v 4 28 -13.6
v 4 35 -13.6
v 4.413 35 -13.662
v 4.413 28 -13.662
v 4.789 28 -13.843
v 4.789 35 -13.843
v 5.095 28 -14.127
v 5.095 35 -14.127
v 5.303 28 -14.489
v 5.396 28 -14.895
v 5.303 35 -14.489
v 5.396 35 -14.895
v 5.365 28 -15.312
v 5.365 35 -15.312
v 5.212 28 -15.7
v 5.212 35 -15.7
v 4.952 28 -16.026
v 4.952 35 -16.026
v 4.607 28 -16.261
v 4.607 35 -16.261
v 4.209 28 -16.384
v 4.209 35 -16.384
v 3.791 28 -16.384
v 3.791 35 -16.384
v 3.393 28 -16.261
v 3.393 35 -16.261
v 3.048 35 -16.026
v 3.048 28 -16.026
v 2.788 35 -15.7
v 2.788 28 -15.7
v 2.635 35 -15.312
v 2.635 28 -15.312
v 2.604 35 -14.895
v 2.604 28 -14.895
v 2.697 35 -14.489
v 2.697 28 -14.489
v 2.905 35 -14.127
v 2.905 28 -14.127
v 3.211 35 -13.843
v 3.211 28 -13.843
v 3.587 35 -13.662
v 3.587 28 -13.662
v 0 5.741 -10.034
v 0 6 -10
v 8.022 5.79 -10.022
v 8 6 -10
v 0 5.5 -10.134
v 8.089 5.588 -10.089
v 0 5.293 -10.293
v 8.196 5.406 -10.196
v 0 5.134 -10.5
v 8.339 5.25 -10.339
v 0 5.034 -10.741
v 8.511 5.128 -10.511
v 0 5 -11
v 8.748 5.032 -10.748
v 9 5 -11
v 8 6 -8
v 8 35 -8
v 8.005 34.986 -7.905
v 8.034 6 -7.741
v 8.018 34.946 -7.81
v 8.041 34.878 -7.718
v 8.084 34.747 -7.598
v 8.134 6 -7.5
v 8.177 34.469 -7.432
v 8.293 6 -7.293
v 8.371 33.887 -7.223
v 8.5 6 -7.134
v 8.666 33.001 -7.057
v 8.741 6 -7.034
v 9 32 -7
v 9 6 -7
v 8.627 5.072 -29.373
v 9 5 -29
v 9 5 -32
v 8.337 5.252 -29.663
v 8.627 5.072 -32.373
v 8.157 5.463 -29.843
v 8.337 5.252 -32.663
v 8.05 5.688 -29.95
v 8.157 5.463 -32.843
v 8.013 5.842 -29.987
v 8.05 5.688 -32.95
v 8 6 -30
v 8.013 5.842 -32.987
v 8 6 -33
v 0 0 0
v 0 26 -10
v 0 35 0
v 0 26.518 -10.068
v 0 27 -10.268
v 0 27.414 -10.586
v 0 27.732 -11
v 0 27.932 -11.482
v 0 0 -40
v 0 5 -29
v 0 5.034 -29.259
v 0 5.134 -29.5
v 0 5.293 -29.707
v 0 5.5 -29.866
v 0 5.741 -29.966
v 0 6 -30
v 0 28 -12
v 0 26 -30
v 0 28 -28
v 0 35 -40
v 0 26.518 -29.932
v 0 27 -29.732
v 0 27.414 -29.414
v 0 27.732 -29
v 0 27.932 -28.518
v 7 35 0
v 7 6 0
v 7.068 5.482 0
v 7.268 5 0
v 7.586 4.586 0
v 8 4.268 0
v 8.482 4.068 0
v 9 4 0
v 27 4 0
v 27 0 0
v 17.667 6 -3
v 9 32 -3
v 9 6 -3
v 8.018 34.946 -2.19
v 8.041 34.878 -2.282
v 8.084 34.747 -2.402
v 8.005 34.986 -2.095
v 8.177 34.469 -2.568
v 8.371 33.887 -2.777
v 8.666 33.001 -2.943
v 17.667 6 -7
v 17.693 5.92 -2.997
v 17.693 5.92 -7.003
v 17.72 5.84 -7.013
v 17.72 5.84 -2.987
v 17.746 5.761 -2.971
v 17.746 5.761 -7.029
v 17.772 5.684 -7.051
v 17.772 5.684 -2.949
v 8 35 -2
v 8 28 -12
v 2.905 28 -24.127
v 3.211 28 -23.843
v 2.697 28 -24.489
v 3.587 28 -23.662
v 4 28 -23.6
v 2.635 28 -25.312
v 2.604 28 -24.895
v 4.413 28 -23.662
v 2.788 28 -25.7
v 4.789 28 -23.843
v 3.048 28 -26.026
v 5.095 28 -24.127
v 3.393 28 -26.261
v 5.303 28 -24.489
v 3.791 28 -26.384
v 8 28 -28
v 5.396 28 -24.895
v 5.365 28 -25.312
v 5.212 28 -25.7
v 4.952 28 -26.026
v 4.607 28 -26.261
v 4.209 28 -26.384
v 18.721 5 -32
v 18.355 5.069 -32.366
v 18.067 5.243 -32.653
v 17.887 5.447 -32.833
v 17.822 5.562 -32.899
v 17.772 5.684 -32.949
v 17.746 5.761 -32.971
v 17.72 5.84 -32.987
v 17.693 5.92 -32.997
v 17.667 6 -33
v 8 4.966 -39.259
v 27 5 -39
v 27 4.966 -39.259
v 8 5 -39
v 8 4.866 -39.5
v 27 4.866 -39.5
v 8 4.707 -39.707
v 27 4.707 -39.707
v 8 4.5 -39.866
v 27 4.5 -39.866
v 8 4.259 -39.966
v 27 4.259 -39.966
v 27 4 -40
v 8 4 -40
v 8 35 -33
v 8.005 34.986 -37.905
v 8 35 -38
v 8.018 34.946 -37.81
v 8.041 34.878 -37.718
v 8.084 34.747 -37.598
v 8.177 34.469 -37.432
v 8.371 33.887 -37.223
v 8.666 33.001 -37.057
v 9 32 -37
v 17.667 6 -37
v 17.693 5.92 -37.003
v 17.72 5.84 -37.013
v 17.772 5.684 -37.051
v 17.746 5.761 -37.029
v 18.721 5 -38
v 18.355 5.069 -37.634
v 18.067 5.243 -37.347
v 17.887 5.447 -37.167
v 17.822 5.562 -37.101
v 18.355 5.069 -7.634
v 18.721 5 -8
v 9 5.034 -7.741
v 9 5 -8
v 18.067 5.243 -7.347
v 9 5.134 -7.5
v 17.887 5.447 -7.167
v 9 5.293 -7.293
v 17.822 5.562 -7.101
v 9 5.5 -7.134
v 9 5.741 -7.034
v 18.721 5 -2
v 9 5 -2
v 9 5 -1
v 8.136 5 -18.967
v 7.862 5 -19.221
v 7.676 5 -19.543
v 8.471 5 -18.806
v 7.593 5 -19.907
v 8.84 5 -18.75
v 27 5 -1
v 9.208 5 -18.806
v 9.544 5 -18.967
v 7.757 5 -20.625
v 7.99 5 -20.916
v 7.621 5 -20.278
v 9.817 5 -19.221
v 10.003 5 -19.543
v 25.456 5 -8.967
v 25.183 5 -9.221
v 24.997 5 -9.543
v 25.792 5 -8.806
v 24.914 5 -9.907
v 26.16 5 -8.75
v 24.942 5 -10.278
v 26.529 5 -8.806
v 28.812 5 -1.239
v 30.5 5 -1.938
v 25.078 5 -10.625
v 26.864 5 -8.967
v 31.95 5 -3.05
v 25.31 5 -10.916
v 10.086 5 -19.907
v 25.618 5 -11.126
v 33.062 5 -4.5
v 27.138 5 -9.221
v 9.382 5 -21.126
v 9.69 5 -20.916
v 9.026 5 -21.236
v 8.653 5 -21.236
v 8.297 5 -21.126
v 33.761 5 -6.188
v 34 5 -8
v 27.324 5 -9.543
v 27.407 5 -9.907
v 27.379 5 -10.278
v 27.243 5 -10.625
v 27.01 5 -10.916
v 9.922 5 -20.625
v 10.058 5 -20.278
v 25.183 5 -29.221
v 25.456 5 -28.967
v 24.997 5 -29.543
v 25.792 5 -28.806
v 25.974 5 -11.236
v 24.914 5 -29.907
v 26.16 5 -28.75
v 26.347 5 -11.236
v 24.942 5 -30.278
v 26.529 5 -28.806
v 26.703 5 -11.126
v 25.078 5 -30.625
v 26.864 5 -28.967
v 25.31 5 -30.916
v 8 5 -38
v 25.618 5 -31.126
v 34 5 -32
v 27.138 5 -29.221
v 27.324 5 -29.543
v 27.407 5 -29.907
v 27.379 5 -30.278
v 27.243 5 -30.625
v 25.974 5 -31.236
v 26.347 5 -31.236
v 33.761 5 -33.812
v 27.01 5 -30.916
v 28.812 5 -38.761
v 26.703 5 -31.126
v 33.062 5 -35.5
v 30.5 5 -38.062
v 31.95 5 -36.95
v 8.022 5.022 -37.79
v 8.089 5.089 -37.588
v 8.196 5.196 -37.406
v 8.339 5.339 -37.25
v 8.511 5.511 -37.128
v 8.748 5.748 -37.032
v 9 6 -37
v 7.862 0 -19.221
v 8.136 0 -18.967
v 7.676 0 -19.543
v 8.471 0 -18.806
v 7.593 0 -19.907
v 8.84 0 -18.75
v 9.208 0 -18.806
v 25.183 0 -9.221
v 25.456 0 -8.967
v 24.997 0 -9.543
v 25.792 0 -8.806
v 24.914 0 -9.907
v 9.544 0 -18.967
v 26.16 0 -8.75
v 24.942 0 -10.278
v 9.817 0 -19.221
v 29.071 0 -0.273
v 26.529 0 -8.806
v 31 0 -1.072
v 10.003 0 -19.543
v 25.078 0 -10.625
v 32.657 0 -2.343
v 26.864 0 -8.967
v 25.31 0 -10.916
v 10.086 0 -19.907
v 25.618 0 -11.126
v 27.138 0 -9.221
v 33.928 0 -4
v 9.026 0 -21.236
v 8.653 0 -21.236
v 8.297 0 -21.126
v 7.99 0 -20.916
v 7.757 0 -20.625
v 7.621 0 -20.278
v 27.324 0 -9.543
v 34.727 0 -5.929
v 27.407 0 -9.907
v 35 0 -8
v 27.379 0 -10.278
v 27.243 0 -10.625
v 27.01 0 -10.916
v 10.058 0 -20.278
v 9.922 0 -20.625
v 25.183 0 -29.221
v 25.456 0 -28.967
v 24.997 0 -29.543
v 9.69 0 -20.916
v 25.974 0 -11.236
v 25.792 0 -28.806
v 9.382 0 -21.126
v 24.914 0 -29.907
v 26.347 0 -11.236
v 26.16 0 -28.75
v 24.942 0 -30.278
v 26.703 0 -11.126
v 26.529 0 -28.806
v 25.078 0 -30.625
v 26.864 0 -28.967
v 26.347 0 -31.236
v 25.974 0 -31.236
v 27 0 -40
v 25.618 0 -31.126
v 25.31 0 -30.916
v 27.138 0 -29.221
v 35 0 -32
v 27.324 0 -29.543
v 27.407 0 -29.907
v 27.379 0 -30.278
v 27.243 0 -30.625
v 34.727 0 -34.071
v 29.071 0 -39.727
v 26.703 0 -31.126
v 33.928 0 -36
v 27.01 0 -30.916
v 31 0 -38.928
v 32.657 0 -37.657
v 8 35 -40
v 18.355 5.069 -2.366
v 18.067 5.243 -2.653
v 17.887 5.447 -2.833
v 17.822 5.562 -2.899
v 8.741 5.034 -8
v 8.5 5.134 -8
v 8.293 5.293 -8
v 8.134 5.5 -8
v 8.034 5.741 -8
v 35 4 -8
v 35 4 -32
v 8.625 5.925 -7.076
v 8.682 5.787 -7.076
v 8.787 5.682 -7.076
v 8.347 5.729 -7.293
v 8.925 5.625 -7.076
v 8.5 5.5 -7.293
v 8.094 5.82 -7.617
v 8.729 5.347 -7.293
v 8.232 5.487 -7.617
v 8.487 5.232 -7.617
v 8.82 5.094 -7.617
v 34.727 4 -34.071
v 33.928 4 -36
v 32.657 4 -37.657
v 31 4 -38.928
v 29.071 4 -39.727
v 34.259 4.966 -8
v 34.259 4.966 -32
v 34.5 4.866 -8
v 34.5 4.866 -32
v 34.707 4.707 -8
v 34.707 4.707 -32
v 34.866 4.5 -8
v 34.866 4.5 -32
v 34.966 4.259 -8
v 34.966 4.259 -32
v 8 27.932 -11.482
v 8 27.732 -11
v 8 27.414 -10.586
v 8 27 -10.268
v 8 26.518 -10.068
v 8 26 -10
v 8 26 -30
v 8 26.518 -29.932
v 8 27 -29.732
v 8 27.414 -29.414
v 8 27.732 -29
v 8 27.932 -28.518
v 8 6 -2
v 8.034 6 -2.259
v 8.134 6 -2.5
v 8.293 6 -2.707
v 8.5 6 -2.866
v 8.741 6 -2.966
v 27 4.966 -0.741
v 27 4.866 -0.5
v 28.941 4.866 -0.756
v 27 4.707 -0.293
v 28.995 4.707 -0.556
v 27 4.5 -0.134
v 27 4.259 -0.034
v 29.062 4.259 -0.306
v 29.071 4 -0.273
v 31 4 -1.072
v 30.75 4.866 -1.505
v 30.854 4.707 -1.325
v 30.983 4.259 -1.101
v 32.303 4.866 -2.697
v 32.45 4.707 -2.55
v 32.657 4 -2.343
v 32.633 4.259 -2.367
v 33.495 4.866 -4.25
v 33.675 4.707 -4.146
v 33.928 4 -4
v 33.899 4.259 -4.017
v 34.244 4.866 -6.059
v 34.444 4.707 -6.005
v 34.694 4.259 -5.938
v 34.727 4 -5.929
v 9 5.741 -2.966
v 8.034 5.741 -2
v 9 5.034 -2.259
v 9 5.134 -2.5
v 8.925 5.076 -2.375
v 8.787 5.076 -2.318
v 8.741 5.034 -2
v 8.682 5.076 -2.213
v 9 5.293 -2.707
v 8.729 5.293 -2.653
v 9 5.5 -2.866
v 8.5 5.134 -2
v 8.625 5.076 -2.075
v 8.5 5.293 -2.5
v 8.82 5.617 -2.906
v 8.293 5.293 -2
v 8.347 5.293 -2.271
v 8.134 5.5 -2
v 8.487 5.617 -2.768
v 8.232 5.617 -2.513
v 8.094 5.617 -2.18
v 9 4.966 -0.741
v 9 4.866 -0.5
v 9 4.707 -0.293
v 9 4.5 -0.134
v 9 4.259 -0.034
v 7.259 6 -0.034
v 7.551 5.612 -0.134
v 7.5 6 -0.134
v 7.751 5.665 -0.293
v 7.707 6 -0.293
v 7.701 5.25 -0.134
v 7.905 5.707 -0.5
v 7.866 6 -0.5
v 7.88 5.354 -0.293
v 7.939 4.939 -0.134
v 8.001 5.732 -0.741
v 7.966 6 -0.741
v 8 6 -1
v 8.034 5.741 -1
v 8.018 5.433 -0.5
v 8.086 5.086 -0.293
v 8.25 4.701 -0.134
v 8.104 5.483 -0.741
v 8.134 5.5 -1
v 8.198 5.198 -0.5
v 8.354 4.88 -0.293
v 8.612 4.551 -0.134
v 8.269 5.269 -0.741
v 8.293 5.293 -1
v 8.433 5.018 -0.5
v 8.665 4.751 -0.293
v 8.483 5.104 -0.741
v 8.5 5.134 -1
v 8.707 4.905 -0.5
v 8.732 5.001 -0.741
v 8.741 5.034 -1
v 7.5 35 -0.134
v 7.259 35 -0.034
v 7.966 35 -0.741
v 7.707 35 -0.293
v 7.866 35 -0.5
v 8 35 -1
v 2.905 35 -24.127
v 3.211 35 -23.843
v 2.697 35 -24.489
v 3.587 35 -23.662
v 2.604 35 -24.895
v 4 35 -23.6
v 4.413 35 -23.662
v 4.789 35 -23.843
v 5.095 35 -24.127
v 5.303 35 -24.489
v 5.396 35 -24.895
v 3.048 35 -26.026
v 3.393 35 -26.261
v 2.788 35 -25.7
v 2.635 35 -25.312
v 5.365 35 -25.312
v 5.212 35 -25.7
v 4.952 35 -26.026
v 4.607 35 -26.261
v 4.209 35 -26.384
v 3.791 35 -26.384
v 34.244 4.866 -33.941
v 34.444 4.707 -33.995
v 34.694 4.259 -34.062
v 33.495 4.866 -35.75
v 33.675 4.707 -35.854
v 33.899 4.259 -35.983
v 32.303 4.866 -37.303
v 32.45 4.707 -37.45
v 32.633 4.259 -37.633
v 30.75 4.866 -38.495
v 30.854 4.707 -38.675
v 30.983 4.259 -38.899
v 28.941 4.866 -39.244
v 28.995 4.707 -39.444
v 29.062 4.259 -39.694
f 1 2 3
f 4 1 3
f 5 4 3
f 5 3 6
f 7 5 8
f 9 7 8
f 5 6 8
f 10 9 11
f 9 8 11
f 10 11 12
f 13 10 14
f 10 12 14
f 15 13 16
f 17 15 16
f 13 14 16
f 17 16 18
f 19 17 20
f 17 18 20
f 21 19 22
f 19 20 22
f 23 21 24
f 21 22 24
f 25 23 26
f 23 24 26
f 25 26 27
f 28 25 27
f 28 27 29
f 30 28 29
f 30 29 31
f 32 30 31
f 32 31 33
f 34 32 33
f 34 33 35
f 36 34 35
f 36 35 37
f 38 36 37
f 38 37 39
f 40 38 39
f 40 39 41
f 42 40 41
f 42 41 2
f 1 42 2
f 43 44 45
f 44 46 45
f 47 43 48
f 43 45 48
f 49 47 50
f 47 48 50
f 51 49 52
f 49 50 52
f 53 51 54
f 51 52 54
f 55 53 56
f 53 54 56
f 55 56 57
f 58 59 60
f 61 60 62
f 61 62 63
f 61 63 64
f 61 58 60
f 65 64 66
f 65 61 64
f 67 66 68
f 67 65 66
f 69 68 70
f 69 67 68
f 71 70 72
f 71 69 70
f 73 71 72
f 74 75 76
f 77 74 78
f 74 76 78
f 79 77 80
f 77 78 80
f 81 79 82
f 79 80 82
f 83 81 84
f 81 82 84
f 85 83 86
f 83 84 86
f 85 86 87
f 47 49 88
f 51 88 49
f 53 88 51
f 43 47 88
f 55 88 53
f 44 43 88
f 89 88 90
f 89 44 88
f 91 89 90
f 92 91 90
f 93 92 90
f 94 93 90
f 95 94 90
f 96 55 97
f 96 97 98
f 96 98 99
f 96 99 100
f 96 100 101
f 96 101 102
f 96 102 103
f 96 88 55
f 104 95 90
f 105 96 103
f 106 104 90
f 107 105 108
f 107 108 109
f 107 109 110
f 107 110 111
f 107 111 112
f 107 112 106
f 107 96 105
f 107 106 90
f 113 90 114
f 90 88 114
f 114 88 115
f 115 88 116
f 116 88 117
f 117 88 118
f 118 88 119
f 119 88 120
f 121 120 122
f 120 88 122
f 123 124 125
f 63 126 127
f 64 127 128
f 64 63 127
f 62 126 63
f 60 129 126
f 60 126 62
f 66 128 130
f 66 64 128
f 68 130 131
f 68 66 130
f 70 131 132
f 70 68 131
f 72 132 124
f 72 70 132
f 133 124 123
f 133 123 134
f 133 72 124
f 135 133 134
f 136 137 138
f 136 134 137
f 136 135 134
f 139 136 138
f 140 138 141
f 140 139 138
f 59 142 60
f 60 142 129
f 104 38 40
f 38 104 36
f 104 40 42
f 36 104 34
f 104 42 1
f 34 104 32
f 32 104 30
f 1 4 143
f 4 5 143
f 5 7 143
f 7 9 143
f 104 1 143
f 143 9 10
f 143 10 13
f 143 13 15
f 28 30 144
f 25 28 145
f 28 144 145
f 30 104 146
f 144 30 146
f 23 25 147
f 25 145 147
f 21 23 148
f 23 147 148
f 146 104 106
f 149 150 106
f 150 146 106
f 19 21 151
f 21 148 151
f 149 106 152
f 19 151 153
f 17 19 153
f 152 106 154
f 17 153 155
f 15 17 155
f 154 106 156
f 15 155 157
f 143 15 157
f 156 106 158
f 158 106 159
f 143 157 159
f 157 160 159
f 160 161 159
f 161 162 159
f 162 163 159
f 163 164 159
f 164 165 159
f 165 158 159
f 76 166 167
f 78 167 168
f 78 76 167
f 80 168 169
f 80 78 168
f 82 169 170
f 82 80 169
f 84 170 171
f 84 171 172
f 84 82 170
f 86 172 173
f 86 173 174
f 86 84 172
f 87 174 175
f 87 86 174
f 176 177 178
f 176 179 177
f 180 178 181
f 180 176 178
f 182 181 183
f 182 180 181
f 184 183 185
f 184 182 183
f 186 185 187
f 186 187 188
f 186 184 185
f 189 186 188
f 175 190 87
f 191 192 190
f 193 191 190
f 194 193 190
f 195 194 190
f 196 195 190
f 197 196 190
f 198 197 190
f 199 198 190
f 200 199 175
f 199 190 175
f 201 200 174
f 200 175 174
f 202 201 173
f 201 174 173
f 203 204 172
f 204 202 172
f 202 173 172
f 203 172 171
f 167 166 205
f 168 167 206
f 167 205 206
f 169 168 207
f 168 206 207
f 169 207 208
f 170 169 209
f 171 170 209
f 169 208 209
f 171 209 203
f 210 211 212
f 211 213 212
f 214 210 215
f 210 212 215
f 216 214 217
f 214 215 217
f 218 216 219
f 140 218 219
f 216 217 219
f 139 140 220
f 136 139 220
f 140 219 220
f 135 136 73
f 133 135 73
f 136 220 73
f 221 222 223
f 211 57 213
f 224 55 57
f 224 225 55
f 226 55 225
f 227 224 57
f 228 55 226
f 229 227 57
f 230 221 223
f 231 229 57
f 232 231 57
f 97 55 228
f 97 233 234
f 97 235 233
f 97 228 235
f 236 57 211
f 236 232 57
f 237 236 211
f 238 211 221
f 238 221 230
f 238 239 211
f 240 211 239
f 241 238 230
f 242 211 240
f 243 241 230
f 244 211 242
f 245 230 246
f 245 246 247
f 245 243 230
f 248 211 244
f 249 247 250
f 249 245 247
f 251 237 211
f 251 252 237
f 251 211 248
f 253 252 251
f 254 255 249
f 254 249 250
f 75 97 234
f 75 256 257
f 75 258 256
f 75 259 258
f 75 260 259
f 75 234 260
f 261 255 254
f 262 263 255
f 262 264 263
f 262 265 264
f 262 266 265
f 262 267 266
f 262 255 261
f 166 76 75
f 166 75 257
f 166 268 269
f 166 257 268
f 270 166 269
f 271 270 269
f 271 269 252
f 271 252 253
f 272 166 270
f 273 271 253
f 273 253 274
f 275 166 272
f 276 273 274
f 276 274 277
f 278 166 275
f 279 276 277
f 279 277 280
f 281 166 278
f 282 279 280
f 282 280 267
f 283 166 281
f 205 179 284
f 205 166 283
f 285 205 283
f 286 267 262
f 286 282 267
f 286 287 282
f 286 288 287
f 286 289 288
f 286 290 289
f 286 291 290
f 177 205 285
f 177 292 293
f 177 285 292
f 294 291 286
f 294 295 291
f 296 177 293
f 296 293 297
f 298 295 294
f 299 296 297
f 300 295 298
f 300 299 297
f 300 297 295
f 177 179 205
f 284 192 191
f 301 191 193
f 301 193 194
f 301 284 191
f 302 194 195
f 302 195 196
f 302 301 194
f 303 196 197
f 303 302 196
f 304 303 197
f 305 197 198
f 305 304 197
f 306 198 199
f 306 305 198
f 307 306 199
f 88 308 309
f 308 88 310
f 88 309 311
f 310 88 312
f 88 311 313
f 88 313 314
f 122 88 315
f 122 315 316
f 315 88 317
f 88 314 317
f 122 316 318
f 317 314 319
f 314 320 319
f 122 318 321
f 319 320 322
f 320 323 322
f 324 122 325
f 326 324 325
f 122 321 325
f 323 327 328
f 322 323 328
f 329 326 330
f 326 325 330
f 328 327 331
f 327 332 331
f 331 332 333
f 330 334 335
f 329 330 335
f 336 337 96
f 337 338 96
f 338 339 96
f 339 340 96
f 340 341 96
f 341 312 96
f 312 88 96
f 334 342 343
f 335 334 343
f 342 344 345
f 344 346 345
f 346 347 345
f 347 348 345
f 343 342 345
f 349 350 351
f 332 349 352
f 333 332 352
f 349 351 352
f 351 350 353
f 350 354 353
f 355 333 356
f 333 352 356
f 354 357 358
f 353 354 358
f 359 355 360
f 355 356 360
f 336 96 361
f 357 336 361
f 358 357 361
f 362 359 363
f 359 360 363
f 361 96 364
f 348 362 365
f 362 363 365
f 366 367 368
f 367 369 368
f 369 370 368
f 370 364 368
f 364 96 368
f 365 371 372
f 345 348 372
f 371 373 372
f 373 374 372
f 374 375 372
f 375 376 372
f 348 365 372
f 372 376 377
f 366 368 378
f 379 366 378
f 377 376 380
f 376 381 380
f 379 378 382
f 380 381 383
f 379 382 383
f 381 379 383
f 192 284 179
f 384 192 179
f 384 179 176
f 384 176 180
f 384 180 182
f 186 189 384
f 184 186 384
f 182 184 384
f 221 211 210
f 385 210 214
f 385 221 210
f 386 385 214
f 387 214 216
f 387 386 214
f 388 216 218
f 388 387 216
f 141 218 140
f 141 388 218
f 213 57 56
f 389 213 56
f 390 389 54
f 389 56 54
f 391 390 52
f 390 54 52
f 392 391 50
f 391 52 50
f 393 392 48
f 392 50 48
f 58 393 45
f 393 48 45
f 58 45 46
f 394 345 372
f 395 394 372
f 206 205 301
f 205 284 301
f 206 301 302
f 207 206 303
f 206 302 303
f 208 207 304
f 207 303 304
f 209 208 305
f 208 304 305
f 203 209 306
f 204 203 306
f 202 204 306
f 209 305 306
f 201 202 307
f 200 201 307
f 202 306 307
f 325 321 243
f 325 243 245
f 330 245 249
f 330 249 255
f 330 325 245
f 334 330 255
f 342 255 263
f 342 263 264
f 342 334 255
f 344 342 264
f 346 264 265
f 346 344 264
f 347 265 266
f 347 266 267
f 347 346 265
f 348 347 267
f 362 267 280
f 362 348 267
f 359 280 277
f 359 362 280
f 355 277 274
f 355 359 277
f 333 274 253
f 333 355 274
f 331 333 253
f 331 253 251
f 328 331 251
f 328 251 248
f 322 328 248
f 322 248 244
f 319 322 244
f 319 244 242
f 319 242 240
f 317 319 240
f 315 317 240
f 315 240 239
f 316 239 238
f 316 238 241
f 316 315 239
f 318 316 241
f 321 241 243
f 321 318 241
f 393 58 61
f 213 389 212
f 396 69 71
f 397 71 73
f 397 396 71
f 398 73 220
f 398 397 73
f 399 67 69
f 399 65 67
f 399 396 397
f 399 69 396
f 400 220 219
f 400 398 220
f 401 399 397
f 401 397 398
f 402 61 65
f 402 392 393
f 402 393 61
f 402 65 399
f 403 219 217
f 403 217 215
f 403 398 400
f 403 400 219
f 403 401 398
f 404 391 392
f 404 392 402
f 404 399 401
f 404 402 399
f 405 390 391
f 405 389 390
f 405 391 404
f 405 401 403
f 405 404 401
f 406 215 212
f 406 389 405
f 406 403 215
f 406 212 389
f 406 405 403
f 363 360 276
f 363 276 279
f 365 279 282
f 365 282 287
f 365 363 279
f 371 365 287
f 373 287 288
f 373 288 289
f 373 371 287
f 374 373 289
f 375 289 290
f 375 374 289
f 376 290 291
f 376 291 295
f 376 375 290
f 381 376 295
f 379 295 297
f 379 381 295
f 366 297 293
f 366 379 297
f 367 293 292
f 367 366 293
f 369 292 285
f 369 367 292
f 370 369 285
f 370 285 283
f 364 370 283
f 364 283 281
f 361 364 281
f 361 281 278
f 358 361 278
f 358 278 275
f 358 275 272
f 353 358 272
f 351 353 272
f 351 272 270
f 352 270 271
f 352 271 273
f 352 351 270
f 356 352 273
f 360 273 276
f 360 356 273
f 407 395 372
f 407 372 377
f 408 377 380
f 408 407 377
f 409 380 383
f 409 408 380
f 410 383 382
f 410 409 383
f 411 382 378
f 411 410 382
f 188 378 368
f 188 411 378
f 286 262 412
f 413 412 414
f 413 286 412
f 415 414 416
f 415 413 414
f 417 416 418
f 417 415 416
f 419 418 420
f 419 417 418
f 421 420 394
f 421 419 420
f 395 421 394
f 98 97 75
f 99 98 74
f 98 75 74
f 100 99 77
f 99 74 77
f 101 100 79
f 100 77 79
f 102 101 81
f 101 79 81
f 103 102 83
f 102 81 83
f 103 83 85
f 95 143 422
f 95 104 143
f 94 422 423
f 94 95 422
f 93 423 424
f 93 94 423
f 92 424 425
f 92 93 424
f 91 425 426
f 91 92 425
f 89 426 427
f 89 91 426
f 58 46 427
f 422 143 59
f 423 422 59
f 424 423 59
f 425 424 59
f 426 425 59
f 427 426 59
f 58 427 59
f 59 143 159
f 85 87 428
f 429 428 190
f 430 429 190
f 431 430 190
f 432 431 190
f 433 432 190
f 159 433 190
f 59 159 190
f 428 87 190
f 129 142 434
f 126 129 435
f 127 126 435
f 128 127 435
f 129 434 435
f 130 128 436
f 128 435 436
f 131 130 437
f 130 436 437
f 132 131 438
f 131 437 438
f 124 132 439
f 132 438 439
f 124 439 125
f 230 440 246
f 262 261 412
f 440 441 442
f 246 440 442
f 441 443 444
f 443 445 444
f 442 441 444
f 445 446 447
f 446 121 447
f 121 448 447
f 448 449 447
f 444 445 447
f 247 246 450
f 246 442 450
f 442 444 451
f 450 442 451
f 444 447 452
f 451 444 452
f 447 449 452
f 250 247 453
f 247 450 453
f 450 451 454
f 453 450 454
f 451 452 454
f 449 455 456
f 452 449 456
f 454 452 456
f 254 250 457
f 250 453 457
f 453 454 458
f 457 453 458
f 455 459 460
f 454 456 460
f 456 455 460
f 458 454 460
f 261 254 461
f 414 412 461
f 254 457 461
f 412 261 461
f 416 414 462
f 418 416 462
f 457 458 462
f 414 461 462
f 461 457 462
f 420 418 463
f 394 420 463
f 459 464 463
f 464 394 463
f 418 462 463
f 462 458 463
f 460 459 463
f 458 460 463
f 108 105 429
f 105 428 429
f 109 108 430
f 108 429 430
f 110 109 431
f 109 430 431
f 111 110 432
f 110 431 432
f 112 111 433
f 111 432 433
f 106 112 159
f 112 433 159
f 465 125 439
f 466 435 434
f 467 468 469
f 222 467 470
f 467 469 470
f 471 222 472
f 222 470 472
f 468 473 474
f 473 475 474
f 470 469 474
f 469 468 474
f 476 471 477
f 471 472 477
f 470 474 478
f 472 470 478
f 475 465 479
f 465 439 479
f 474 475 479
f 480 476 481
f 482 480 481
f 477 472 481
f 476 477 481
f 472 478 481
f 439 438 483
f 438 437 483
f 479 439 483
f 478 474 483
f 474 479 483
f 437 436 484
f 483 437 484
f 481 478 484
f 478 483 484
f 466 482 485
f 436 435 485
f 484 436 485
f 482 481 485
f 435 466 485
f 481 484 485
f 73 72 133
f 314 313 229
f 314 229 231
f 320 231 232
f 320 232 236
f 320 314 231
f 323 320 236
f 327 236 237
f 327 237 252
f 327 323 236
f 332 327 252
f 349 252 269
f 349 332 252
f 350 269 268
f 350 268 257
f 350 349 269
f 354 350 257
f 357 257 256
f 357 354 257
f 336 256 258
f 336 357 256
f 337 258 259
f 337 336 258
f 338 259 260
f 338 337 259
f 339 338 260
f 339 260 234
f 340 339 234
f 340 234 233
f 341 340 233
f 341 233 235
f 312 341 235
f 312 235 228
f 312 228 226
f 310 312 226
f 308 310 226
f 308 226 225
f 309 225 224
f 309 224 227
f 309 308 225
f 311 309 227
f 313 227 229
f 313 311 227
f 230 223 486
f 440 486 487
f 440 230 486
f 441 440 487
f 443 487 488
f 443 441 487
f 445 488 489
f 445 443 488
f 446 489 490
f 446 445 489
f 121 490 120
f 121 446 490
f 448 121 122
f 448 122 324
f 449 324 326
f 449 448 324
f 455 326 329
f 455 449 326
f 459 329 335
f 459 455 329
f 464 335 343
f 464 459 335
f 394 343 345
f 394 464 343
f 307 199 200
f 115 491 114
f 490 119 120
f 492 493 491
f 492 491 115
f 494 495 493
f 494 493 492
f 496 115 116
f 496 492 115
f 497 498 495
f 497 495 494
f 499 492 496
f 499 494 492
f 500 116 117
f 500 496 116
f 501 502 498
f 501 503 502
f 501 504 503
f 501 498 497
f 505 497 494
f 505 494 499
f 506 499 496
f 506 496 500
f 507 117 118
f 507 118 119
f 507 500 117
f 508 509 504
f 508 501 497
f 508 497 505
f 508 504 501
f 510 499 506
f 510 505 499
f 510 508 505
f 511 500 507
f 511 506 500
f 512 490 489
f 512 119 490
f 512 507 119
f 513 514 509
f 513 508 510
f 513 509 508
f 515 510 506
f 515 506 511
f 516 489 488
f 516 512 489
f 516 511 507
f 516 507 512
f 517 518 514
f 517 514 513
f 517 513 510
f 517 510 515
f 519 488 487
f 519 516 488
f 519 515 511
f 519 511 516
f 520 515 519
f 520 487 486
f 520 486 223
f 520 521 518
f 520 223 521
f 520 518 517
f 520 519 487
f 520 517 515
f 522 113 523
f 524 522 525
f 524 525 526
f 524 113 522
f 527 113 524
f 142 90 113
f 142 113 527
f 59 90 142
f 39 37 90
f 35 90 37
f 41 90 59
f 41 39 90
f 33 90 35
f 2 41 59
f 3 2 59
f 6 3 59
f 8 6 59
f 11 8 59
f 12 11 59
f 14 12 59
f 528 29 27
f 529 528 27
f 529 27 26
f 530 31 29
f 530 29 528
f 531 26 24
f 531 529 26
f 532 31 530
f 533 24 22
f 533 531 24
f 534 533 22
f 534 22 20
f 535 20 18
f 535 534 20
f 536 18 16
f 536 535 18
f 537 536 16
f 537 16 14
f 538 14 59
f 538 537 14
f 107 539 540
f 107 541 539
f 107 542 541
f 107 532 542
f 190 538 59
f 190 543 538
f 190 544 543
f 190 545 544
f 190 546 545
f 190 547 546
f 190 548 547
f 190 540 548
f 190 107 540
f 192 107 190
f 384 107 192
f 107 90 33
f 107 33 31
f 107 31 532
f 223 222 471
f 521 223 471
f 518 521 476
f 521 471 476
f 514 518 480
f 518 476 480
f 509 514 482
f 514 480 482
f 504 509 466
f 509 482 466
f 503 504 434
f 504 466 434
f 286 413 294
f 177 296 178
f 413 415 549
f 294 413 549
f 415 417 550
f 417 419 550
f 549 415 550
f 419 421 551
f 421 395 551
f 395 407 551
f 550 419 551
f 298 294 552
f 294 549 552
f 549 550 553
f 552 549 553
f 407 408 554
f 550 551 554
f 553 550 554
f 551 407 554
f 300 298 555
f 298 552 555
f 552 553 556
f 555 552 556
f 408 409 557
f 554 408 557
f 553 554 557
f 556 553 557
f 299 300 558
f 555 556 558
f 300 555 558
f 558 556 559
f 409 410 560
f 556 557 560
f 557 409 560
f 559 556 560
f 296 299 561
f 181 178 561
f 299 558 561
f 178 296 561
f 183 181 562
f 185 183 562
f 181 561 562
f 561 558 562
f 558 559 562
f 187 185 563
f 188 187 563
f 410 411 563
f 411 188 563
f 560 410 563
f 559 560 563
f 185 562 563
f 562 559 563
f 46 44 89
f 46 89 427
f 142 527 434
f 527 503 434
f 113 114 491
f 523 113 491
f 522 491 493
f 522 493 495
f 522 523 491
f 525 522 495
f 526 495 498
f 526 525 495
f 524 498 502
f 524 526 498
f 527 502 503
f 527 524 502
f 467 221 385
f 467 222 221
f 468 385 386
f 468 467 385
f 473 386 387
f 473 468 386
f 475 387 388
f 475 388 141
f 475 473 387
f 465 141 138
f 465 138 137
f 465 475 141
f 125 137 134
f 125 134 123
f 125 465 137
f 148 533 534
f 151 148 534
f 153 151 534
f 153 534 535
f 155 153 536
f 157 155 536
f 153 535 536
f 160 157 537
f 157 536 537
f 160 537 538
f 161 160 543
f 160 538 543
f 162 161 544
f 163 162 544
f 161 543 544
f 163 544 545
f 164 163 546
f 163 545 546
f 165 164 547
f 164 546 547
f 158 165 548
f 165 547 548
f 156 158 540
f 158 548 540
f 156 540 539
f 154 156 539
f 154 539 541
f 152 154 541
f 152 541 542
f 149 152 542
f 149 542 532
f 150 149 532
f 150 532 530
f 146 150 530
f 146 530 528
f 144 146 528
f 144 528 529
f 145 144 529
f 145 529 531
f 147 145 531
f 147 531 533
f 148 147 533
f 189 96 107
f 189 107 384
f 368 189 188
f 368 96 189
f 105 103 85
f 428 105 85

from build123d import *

# Parameters (mm, degrees)
SKETCH1_W           = 35
SKETCH1_H           = 40
SKETCH1_R           = 1.25
BOSS_EXTRUDE1_DEPTH = 5
FILLET1_R           = 8
FILLET2_R           = 8
SKETCH2_W           = 8
SKETCH2_H           = 10
BOSS_EXTRUDE2_DEPTH = 30
RIB1_REACH          = 62.622
SKETCH4_WALL_W      = 154.866333132
SKETCH4_WALL_H      = 4
BOSS_EXTRUDE3_REACH = 59.879
SKETCH5_W           = 8
SKETCH5_H           = 7
CUT_EXTRUDE1_REACH  = 65.64
SKETCH6_R           = 1.4
FILLET7_R           = 1
FILLET8_R           = 2


with BuildPart() as part:
    # Sketch1 → Boss-Extrude1 (new body)
    with BuildSketch(Plane(origin=(0, 0, 0), x_dir=(1, 0, 0), z_dir=(0, 1, 0))):
        with Locations((17.5, 20)):
            Rectangle(SKETCH1_W, SKETCH1_H)
        with Locations(Location((26.160254038, 30, 0), (0, 0, 270))):
            Circle(SKETCH1_R, mode=Mode.SUBTRACT)
        with Locations(Location((8.839745962, 20, 0), (0, 0, 270))):
            Circle(SKETCH1_R, mode=Mode.SUBTRACT)
        with Locations(Location((26.160254038, 10, 0), (0, 0, 270))):
            Circle(SKETCH1_R, mode=Mode.SUBTRACT)
    extrude(amount=BOSS_EXTRUDE1_DEPTH)

    # Fillet1
    fillet1_edges = [part.edges().sort_by_distance(p)[0] for p in [
        (35, 2.5, 0),
    ]]
    fillet(fillet1_edges, radius=FILLET1_R)

    # Fillet2
    fillet2_edges = [part.edges().sort_by_distance(p)[0] for p in [
        (35, 2.5, -40),
    ]]
    fillet(fillet2_edges, radius=FILLET2_R)

    # Sketch2 → Boss-Extrude2 (add)
    with BuildSketch(Plane(origin=(0, 5, 0), x_dir=(1, 0, 0), z_dir=(0, 1, 0))):
        with Locations((4, 5)):
            Rectangle(SKETCH2_W, SKETCH2_H)
        with Locations((4, 35)):
            Rectangle(SKETCH2_W, SKETCH2_H)
    extrude(amount=BOSS_EXTRUDE2_DEPTH)

    # Sketch4 wall → Rib1 (add, up to next)
    with BuildSketch(Plane(origin=(13, 20, -5), x_dir=(0.316227766017, -0.948683298051, 0), z_dir=(0.948683298051, 0.316227766017, 0)), mode=Mode.PRIVATE) as rib1_sk1:
        Rectangle(SKETCH4_WALL_W, SKETCH4_WALL_H)
    rib1_tool1 = extrude(rib1_sk1.sketch, amount=-RIB1_REACH, mode=Mode.PRIVATE) - part.part
    rib1 = rib1_tool1.solids().sort_by_distance((13, 20, -5))[0]
    add(rib1)

    # Mirror2: Rib1 across plane
    add(rib1.mirror(Plane(origin=(0, 0, -20), x_dir=(1, 0, 0), z_dir=(0, 0, -1))))

    # Sketch5 → Boss-Extrude3 (add, up to next)
    with BuildSketch(Plane.XY.offset(-30), mode=Mode.PRIVATE) as boss_extrude3_sk1:
        with Locations((4, 31.5)):
            Rectangle(SKETCH5_W, SKETCH5_H)
    boss_extrude3_tool1 = extrude(boss_extrude3_sk1.sketch, amount=BOSS_EXTRUDE3_REACH, mode=Mode.PRIVATE) - part.part
    add(boss_extrude3_tool1.solids().sort_by_distance((4, 31.5, -30))[0])

    # Sketch6 → Cut-Extrude1 (cut, up to next)
    with BuildSketch(Plane(origin=(0, 35, 0), x_dir=(1, 0, 0), z_dir=(0, 1, 0)), mode=Mode.PRIVATE) as cut_extrude1_sk1:
        with Locations(Location((4, 15, 0), (0, 0, 270))):
            Circle(SKETCH6_R)
    cut_extrude1_tool1 = extrude(cut_extrude1_sk1.sketch, amount=-CUT_EXTRUDE1_REACH, mode=Mode.PRIVATE) & part.part
    # Sketch6 → Cut-Extrude1 (cut, up to next)
    with BuildSketch(Plane(origin=(0, 35, 0), x_dir=(1, 0, 0), z_dir=(0, 1, 0)), mode=Mode.PRIVATE) as cut_extrude1_sk2:
        with Locations(Location((4, 25, 0), (0, 0, 270))):
            Circle(SKETCH6_R)
    cut_extrude1_tool2 = extrude(cut_extrude1_sk2.sketch, amount=-CUT_EXTRUDE1_REACH, mode=Mode.PRIVATE) & part.part
    add(cut_extrude1_tool1.solids().sort_by_distance((4, 35, -15))[0], mode=Mode.SUBTRACT)
    add(cut_extrude1_tool2.solids().sort_by_distance((4, 35, -25))[0], mode=Mode.SUBTRACT)

    # Fillet7
    fillet7_edges = [part.edges().sort_by_distance(p)[0] for p in [
        (8, 20, 0),
        (32.656854249, 5, -37.656854249),
        (17.5, 5, -40),
        (8, 20, -37),
        (13, 5, -37),
        (18, 5, -35),
        (13, 5, -33),
        (8, 5, -31.5),
        (4, 5, -30),
        (4, 5, -10),
        (8, 5, -8.5),
        (35, 5, -20),
        (32.656854249, 5, -2.343145751),
        (8, 20, -3),
        (8, 20, -7),
        (13, 5, -7),
        (18, 5, -5),
        (13, 5, -3),
        (17.5, 5, 0),
        (8, 5, -1.5),
    ]]
    fillet(fillet7_edges, radius=FILLET7_R)

    # Fillet8
    fillet8_edges = [part.edges().sort_by_distance(p)[0] for p in [
        (4, 28, -10),
        (4, 28, -30),
    ]]
    fillet(fillet8_edges, radius=FILLET8_R)


solid = part.part
